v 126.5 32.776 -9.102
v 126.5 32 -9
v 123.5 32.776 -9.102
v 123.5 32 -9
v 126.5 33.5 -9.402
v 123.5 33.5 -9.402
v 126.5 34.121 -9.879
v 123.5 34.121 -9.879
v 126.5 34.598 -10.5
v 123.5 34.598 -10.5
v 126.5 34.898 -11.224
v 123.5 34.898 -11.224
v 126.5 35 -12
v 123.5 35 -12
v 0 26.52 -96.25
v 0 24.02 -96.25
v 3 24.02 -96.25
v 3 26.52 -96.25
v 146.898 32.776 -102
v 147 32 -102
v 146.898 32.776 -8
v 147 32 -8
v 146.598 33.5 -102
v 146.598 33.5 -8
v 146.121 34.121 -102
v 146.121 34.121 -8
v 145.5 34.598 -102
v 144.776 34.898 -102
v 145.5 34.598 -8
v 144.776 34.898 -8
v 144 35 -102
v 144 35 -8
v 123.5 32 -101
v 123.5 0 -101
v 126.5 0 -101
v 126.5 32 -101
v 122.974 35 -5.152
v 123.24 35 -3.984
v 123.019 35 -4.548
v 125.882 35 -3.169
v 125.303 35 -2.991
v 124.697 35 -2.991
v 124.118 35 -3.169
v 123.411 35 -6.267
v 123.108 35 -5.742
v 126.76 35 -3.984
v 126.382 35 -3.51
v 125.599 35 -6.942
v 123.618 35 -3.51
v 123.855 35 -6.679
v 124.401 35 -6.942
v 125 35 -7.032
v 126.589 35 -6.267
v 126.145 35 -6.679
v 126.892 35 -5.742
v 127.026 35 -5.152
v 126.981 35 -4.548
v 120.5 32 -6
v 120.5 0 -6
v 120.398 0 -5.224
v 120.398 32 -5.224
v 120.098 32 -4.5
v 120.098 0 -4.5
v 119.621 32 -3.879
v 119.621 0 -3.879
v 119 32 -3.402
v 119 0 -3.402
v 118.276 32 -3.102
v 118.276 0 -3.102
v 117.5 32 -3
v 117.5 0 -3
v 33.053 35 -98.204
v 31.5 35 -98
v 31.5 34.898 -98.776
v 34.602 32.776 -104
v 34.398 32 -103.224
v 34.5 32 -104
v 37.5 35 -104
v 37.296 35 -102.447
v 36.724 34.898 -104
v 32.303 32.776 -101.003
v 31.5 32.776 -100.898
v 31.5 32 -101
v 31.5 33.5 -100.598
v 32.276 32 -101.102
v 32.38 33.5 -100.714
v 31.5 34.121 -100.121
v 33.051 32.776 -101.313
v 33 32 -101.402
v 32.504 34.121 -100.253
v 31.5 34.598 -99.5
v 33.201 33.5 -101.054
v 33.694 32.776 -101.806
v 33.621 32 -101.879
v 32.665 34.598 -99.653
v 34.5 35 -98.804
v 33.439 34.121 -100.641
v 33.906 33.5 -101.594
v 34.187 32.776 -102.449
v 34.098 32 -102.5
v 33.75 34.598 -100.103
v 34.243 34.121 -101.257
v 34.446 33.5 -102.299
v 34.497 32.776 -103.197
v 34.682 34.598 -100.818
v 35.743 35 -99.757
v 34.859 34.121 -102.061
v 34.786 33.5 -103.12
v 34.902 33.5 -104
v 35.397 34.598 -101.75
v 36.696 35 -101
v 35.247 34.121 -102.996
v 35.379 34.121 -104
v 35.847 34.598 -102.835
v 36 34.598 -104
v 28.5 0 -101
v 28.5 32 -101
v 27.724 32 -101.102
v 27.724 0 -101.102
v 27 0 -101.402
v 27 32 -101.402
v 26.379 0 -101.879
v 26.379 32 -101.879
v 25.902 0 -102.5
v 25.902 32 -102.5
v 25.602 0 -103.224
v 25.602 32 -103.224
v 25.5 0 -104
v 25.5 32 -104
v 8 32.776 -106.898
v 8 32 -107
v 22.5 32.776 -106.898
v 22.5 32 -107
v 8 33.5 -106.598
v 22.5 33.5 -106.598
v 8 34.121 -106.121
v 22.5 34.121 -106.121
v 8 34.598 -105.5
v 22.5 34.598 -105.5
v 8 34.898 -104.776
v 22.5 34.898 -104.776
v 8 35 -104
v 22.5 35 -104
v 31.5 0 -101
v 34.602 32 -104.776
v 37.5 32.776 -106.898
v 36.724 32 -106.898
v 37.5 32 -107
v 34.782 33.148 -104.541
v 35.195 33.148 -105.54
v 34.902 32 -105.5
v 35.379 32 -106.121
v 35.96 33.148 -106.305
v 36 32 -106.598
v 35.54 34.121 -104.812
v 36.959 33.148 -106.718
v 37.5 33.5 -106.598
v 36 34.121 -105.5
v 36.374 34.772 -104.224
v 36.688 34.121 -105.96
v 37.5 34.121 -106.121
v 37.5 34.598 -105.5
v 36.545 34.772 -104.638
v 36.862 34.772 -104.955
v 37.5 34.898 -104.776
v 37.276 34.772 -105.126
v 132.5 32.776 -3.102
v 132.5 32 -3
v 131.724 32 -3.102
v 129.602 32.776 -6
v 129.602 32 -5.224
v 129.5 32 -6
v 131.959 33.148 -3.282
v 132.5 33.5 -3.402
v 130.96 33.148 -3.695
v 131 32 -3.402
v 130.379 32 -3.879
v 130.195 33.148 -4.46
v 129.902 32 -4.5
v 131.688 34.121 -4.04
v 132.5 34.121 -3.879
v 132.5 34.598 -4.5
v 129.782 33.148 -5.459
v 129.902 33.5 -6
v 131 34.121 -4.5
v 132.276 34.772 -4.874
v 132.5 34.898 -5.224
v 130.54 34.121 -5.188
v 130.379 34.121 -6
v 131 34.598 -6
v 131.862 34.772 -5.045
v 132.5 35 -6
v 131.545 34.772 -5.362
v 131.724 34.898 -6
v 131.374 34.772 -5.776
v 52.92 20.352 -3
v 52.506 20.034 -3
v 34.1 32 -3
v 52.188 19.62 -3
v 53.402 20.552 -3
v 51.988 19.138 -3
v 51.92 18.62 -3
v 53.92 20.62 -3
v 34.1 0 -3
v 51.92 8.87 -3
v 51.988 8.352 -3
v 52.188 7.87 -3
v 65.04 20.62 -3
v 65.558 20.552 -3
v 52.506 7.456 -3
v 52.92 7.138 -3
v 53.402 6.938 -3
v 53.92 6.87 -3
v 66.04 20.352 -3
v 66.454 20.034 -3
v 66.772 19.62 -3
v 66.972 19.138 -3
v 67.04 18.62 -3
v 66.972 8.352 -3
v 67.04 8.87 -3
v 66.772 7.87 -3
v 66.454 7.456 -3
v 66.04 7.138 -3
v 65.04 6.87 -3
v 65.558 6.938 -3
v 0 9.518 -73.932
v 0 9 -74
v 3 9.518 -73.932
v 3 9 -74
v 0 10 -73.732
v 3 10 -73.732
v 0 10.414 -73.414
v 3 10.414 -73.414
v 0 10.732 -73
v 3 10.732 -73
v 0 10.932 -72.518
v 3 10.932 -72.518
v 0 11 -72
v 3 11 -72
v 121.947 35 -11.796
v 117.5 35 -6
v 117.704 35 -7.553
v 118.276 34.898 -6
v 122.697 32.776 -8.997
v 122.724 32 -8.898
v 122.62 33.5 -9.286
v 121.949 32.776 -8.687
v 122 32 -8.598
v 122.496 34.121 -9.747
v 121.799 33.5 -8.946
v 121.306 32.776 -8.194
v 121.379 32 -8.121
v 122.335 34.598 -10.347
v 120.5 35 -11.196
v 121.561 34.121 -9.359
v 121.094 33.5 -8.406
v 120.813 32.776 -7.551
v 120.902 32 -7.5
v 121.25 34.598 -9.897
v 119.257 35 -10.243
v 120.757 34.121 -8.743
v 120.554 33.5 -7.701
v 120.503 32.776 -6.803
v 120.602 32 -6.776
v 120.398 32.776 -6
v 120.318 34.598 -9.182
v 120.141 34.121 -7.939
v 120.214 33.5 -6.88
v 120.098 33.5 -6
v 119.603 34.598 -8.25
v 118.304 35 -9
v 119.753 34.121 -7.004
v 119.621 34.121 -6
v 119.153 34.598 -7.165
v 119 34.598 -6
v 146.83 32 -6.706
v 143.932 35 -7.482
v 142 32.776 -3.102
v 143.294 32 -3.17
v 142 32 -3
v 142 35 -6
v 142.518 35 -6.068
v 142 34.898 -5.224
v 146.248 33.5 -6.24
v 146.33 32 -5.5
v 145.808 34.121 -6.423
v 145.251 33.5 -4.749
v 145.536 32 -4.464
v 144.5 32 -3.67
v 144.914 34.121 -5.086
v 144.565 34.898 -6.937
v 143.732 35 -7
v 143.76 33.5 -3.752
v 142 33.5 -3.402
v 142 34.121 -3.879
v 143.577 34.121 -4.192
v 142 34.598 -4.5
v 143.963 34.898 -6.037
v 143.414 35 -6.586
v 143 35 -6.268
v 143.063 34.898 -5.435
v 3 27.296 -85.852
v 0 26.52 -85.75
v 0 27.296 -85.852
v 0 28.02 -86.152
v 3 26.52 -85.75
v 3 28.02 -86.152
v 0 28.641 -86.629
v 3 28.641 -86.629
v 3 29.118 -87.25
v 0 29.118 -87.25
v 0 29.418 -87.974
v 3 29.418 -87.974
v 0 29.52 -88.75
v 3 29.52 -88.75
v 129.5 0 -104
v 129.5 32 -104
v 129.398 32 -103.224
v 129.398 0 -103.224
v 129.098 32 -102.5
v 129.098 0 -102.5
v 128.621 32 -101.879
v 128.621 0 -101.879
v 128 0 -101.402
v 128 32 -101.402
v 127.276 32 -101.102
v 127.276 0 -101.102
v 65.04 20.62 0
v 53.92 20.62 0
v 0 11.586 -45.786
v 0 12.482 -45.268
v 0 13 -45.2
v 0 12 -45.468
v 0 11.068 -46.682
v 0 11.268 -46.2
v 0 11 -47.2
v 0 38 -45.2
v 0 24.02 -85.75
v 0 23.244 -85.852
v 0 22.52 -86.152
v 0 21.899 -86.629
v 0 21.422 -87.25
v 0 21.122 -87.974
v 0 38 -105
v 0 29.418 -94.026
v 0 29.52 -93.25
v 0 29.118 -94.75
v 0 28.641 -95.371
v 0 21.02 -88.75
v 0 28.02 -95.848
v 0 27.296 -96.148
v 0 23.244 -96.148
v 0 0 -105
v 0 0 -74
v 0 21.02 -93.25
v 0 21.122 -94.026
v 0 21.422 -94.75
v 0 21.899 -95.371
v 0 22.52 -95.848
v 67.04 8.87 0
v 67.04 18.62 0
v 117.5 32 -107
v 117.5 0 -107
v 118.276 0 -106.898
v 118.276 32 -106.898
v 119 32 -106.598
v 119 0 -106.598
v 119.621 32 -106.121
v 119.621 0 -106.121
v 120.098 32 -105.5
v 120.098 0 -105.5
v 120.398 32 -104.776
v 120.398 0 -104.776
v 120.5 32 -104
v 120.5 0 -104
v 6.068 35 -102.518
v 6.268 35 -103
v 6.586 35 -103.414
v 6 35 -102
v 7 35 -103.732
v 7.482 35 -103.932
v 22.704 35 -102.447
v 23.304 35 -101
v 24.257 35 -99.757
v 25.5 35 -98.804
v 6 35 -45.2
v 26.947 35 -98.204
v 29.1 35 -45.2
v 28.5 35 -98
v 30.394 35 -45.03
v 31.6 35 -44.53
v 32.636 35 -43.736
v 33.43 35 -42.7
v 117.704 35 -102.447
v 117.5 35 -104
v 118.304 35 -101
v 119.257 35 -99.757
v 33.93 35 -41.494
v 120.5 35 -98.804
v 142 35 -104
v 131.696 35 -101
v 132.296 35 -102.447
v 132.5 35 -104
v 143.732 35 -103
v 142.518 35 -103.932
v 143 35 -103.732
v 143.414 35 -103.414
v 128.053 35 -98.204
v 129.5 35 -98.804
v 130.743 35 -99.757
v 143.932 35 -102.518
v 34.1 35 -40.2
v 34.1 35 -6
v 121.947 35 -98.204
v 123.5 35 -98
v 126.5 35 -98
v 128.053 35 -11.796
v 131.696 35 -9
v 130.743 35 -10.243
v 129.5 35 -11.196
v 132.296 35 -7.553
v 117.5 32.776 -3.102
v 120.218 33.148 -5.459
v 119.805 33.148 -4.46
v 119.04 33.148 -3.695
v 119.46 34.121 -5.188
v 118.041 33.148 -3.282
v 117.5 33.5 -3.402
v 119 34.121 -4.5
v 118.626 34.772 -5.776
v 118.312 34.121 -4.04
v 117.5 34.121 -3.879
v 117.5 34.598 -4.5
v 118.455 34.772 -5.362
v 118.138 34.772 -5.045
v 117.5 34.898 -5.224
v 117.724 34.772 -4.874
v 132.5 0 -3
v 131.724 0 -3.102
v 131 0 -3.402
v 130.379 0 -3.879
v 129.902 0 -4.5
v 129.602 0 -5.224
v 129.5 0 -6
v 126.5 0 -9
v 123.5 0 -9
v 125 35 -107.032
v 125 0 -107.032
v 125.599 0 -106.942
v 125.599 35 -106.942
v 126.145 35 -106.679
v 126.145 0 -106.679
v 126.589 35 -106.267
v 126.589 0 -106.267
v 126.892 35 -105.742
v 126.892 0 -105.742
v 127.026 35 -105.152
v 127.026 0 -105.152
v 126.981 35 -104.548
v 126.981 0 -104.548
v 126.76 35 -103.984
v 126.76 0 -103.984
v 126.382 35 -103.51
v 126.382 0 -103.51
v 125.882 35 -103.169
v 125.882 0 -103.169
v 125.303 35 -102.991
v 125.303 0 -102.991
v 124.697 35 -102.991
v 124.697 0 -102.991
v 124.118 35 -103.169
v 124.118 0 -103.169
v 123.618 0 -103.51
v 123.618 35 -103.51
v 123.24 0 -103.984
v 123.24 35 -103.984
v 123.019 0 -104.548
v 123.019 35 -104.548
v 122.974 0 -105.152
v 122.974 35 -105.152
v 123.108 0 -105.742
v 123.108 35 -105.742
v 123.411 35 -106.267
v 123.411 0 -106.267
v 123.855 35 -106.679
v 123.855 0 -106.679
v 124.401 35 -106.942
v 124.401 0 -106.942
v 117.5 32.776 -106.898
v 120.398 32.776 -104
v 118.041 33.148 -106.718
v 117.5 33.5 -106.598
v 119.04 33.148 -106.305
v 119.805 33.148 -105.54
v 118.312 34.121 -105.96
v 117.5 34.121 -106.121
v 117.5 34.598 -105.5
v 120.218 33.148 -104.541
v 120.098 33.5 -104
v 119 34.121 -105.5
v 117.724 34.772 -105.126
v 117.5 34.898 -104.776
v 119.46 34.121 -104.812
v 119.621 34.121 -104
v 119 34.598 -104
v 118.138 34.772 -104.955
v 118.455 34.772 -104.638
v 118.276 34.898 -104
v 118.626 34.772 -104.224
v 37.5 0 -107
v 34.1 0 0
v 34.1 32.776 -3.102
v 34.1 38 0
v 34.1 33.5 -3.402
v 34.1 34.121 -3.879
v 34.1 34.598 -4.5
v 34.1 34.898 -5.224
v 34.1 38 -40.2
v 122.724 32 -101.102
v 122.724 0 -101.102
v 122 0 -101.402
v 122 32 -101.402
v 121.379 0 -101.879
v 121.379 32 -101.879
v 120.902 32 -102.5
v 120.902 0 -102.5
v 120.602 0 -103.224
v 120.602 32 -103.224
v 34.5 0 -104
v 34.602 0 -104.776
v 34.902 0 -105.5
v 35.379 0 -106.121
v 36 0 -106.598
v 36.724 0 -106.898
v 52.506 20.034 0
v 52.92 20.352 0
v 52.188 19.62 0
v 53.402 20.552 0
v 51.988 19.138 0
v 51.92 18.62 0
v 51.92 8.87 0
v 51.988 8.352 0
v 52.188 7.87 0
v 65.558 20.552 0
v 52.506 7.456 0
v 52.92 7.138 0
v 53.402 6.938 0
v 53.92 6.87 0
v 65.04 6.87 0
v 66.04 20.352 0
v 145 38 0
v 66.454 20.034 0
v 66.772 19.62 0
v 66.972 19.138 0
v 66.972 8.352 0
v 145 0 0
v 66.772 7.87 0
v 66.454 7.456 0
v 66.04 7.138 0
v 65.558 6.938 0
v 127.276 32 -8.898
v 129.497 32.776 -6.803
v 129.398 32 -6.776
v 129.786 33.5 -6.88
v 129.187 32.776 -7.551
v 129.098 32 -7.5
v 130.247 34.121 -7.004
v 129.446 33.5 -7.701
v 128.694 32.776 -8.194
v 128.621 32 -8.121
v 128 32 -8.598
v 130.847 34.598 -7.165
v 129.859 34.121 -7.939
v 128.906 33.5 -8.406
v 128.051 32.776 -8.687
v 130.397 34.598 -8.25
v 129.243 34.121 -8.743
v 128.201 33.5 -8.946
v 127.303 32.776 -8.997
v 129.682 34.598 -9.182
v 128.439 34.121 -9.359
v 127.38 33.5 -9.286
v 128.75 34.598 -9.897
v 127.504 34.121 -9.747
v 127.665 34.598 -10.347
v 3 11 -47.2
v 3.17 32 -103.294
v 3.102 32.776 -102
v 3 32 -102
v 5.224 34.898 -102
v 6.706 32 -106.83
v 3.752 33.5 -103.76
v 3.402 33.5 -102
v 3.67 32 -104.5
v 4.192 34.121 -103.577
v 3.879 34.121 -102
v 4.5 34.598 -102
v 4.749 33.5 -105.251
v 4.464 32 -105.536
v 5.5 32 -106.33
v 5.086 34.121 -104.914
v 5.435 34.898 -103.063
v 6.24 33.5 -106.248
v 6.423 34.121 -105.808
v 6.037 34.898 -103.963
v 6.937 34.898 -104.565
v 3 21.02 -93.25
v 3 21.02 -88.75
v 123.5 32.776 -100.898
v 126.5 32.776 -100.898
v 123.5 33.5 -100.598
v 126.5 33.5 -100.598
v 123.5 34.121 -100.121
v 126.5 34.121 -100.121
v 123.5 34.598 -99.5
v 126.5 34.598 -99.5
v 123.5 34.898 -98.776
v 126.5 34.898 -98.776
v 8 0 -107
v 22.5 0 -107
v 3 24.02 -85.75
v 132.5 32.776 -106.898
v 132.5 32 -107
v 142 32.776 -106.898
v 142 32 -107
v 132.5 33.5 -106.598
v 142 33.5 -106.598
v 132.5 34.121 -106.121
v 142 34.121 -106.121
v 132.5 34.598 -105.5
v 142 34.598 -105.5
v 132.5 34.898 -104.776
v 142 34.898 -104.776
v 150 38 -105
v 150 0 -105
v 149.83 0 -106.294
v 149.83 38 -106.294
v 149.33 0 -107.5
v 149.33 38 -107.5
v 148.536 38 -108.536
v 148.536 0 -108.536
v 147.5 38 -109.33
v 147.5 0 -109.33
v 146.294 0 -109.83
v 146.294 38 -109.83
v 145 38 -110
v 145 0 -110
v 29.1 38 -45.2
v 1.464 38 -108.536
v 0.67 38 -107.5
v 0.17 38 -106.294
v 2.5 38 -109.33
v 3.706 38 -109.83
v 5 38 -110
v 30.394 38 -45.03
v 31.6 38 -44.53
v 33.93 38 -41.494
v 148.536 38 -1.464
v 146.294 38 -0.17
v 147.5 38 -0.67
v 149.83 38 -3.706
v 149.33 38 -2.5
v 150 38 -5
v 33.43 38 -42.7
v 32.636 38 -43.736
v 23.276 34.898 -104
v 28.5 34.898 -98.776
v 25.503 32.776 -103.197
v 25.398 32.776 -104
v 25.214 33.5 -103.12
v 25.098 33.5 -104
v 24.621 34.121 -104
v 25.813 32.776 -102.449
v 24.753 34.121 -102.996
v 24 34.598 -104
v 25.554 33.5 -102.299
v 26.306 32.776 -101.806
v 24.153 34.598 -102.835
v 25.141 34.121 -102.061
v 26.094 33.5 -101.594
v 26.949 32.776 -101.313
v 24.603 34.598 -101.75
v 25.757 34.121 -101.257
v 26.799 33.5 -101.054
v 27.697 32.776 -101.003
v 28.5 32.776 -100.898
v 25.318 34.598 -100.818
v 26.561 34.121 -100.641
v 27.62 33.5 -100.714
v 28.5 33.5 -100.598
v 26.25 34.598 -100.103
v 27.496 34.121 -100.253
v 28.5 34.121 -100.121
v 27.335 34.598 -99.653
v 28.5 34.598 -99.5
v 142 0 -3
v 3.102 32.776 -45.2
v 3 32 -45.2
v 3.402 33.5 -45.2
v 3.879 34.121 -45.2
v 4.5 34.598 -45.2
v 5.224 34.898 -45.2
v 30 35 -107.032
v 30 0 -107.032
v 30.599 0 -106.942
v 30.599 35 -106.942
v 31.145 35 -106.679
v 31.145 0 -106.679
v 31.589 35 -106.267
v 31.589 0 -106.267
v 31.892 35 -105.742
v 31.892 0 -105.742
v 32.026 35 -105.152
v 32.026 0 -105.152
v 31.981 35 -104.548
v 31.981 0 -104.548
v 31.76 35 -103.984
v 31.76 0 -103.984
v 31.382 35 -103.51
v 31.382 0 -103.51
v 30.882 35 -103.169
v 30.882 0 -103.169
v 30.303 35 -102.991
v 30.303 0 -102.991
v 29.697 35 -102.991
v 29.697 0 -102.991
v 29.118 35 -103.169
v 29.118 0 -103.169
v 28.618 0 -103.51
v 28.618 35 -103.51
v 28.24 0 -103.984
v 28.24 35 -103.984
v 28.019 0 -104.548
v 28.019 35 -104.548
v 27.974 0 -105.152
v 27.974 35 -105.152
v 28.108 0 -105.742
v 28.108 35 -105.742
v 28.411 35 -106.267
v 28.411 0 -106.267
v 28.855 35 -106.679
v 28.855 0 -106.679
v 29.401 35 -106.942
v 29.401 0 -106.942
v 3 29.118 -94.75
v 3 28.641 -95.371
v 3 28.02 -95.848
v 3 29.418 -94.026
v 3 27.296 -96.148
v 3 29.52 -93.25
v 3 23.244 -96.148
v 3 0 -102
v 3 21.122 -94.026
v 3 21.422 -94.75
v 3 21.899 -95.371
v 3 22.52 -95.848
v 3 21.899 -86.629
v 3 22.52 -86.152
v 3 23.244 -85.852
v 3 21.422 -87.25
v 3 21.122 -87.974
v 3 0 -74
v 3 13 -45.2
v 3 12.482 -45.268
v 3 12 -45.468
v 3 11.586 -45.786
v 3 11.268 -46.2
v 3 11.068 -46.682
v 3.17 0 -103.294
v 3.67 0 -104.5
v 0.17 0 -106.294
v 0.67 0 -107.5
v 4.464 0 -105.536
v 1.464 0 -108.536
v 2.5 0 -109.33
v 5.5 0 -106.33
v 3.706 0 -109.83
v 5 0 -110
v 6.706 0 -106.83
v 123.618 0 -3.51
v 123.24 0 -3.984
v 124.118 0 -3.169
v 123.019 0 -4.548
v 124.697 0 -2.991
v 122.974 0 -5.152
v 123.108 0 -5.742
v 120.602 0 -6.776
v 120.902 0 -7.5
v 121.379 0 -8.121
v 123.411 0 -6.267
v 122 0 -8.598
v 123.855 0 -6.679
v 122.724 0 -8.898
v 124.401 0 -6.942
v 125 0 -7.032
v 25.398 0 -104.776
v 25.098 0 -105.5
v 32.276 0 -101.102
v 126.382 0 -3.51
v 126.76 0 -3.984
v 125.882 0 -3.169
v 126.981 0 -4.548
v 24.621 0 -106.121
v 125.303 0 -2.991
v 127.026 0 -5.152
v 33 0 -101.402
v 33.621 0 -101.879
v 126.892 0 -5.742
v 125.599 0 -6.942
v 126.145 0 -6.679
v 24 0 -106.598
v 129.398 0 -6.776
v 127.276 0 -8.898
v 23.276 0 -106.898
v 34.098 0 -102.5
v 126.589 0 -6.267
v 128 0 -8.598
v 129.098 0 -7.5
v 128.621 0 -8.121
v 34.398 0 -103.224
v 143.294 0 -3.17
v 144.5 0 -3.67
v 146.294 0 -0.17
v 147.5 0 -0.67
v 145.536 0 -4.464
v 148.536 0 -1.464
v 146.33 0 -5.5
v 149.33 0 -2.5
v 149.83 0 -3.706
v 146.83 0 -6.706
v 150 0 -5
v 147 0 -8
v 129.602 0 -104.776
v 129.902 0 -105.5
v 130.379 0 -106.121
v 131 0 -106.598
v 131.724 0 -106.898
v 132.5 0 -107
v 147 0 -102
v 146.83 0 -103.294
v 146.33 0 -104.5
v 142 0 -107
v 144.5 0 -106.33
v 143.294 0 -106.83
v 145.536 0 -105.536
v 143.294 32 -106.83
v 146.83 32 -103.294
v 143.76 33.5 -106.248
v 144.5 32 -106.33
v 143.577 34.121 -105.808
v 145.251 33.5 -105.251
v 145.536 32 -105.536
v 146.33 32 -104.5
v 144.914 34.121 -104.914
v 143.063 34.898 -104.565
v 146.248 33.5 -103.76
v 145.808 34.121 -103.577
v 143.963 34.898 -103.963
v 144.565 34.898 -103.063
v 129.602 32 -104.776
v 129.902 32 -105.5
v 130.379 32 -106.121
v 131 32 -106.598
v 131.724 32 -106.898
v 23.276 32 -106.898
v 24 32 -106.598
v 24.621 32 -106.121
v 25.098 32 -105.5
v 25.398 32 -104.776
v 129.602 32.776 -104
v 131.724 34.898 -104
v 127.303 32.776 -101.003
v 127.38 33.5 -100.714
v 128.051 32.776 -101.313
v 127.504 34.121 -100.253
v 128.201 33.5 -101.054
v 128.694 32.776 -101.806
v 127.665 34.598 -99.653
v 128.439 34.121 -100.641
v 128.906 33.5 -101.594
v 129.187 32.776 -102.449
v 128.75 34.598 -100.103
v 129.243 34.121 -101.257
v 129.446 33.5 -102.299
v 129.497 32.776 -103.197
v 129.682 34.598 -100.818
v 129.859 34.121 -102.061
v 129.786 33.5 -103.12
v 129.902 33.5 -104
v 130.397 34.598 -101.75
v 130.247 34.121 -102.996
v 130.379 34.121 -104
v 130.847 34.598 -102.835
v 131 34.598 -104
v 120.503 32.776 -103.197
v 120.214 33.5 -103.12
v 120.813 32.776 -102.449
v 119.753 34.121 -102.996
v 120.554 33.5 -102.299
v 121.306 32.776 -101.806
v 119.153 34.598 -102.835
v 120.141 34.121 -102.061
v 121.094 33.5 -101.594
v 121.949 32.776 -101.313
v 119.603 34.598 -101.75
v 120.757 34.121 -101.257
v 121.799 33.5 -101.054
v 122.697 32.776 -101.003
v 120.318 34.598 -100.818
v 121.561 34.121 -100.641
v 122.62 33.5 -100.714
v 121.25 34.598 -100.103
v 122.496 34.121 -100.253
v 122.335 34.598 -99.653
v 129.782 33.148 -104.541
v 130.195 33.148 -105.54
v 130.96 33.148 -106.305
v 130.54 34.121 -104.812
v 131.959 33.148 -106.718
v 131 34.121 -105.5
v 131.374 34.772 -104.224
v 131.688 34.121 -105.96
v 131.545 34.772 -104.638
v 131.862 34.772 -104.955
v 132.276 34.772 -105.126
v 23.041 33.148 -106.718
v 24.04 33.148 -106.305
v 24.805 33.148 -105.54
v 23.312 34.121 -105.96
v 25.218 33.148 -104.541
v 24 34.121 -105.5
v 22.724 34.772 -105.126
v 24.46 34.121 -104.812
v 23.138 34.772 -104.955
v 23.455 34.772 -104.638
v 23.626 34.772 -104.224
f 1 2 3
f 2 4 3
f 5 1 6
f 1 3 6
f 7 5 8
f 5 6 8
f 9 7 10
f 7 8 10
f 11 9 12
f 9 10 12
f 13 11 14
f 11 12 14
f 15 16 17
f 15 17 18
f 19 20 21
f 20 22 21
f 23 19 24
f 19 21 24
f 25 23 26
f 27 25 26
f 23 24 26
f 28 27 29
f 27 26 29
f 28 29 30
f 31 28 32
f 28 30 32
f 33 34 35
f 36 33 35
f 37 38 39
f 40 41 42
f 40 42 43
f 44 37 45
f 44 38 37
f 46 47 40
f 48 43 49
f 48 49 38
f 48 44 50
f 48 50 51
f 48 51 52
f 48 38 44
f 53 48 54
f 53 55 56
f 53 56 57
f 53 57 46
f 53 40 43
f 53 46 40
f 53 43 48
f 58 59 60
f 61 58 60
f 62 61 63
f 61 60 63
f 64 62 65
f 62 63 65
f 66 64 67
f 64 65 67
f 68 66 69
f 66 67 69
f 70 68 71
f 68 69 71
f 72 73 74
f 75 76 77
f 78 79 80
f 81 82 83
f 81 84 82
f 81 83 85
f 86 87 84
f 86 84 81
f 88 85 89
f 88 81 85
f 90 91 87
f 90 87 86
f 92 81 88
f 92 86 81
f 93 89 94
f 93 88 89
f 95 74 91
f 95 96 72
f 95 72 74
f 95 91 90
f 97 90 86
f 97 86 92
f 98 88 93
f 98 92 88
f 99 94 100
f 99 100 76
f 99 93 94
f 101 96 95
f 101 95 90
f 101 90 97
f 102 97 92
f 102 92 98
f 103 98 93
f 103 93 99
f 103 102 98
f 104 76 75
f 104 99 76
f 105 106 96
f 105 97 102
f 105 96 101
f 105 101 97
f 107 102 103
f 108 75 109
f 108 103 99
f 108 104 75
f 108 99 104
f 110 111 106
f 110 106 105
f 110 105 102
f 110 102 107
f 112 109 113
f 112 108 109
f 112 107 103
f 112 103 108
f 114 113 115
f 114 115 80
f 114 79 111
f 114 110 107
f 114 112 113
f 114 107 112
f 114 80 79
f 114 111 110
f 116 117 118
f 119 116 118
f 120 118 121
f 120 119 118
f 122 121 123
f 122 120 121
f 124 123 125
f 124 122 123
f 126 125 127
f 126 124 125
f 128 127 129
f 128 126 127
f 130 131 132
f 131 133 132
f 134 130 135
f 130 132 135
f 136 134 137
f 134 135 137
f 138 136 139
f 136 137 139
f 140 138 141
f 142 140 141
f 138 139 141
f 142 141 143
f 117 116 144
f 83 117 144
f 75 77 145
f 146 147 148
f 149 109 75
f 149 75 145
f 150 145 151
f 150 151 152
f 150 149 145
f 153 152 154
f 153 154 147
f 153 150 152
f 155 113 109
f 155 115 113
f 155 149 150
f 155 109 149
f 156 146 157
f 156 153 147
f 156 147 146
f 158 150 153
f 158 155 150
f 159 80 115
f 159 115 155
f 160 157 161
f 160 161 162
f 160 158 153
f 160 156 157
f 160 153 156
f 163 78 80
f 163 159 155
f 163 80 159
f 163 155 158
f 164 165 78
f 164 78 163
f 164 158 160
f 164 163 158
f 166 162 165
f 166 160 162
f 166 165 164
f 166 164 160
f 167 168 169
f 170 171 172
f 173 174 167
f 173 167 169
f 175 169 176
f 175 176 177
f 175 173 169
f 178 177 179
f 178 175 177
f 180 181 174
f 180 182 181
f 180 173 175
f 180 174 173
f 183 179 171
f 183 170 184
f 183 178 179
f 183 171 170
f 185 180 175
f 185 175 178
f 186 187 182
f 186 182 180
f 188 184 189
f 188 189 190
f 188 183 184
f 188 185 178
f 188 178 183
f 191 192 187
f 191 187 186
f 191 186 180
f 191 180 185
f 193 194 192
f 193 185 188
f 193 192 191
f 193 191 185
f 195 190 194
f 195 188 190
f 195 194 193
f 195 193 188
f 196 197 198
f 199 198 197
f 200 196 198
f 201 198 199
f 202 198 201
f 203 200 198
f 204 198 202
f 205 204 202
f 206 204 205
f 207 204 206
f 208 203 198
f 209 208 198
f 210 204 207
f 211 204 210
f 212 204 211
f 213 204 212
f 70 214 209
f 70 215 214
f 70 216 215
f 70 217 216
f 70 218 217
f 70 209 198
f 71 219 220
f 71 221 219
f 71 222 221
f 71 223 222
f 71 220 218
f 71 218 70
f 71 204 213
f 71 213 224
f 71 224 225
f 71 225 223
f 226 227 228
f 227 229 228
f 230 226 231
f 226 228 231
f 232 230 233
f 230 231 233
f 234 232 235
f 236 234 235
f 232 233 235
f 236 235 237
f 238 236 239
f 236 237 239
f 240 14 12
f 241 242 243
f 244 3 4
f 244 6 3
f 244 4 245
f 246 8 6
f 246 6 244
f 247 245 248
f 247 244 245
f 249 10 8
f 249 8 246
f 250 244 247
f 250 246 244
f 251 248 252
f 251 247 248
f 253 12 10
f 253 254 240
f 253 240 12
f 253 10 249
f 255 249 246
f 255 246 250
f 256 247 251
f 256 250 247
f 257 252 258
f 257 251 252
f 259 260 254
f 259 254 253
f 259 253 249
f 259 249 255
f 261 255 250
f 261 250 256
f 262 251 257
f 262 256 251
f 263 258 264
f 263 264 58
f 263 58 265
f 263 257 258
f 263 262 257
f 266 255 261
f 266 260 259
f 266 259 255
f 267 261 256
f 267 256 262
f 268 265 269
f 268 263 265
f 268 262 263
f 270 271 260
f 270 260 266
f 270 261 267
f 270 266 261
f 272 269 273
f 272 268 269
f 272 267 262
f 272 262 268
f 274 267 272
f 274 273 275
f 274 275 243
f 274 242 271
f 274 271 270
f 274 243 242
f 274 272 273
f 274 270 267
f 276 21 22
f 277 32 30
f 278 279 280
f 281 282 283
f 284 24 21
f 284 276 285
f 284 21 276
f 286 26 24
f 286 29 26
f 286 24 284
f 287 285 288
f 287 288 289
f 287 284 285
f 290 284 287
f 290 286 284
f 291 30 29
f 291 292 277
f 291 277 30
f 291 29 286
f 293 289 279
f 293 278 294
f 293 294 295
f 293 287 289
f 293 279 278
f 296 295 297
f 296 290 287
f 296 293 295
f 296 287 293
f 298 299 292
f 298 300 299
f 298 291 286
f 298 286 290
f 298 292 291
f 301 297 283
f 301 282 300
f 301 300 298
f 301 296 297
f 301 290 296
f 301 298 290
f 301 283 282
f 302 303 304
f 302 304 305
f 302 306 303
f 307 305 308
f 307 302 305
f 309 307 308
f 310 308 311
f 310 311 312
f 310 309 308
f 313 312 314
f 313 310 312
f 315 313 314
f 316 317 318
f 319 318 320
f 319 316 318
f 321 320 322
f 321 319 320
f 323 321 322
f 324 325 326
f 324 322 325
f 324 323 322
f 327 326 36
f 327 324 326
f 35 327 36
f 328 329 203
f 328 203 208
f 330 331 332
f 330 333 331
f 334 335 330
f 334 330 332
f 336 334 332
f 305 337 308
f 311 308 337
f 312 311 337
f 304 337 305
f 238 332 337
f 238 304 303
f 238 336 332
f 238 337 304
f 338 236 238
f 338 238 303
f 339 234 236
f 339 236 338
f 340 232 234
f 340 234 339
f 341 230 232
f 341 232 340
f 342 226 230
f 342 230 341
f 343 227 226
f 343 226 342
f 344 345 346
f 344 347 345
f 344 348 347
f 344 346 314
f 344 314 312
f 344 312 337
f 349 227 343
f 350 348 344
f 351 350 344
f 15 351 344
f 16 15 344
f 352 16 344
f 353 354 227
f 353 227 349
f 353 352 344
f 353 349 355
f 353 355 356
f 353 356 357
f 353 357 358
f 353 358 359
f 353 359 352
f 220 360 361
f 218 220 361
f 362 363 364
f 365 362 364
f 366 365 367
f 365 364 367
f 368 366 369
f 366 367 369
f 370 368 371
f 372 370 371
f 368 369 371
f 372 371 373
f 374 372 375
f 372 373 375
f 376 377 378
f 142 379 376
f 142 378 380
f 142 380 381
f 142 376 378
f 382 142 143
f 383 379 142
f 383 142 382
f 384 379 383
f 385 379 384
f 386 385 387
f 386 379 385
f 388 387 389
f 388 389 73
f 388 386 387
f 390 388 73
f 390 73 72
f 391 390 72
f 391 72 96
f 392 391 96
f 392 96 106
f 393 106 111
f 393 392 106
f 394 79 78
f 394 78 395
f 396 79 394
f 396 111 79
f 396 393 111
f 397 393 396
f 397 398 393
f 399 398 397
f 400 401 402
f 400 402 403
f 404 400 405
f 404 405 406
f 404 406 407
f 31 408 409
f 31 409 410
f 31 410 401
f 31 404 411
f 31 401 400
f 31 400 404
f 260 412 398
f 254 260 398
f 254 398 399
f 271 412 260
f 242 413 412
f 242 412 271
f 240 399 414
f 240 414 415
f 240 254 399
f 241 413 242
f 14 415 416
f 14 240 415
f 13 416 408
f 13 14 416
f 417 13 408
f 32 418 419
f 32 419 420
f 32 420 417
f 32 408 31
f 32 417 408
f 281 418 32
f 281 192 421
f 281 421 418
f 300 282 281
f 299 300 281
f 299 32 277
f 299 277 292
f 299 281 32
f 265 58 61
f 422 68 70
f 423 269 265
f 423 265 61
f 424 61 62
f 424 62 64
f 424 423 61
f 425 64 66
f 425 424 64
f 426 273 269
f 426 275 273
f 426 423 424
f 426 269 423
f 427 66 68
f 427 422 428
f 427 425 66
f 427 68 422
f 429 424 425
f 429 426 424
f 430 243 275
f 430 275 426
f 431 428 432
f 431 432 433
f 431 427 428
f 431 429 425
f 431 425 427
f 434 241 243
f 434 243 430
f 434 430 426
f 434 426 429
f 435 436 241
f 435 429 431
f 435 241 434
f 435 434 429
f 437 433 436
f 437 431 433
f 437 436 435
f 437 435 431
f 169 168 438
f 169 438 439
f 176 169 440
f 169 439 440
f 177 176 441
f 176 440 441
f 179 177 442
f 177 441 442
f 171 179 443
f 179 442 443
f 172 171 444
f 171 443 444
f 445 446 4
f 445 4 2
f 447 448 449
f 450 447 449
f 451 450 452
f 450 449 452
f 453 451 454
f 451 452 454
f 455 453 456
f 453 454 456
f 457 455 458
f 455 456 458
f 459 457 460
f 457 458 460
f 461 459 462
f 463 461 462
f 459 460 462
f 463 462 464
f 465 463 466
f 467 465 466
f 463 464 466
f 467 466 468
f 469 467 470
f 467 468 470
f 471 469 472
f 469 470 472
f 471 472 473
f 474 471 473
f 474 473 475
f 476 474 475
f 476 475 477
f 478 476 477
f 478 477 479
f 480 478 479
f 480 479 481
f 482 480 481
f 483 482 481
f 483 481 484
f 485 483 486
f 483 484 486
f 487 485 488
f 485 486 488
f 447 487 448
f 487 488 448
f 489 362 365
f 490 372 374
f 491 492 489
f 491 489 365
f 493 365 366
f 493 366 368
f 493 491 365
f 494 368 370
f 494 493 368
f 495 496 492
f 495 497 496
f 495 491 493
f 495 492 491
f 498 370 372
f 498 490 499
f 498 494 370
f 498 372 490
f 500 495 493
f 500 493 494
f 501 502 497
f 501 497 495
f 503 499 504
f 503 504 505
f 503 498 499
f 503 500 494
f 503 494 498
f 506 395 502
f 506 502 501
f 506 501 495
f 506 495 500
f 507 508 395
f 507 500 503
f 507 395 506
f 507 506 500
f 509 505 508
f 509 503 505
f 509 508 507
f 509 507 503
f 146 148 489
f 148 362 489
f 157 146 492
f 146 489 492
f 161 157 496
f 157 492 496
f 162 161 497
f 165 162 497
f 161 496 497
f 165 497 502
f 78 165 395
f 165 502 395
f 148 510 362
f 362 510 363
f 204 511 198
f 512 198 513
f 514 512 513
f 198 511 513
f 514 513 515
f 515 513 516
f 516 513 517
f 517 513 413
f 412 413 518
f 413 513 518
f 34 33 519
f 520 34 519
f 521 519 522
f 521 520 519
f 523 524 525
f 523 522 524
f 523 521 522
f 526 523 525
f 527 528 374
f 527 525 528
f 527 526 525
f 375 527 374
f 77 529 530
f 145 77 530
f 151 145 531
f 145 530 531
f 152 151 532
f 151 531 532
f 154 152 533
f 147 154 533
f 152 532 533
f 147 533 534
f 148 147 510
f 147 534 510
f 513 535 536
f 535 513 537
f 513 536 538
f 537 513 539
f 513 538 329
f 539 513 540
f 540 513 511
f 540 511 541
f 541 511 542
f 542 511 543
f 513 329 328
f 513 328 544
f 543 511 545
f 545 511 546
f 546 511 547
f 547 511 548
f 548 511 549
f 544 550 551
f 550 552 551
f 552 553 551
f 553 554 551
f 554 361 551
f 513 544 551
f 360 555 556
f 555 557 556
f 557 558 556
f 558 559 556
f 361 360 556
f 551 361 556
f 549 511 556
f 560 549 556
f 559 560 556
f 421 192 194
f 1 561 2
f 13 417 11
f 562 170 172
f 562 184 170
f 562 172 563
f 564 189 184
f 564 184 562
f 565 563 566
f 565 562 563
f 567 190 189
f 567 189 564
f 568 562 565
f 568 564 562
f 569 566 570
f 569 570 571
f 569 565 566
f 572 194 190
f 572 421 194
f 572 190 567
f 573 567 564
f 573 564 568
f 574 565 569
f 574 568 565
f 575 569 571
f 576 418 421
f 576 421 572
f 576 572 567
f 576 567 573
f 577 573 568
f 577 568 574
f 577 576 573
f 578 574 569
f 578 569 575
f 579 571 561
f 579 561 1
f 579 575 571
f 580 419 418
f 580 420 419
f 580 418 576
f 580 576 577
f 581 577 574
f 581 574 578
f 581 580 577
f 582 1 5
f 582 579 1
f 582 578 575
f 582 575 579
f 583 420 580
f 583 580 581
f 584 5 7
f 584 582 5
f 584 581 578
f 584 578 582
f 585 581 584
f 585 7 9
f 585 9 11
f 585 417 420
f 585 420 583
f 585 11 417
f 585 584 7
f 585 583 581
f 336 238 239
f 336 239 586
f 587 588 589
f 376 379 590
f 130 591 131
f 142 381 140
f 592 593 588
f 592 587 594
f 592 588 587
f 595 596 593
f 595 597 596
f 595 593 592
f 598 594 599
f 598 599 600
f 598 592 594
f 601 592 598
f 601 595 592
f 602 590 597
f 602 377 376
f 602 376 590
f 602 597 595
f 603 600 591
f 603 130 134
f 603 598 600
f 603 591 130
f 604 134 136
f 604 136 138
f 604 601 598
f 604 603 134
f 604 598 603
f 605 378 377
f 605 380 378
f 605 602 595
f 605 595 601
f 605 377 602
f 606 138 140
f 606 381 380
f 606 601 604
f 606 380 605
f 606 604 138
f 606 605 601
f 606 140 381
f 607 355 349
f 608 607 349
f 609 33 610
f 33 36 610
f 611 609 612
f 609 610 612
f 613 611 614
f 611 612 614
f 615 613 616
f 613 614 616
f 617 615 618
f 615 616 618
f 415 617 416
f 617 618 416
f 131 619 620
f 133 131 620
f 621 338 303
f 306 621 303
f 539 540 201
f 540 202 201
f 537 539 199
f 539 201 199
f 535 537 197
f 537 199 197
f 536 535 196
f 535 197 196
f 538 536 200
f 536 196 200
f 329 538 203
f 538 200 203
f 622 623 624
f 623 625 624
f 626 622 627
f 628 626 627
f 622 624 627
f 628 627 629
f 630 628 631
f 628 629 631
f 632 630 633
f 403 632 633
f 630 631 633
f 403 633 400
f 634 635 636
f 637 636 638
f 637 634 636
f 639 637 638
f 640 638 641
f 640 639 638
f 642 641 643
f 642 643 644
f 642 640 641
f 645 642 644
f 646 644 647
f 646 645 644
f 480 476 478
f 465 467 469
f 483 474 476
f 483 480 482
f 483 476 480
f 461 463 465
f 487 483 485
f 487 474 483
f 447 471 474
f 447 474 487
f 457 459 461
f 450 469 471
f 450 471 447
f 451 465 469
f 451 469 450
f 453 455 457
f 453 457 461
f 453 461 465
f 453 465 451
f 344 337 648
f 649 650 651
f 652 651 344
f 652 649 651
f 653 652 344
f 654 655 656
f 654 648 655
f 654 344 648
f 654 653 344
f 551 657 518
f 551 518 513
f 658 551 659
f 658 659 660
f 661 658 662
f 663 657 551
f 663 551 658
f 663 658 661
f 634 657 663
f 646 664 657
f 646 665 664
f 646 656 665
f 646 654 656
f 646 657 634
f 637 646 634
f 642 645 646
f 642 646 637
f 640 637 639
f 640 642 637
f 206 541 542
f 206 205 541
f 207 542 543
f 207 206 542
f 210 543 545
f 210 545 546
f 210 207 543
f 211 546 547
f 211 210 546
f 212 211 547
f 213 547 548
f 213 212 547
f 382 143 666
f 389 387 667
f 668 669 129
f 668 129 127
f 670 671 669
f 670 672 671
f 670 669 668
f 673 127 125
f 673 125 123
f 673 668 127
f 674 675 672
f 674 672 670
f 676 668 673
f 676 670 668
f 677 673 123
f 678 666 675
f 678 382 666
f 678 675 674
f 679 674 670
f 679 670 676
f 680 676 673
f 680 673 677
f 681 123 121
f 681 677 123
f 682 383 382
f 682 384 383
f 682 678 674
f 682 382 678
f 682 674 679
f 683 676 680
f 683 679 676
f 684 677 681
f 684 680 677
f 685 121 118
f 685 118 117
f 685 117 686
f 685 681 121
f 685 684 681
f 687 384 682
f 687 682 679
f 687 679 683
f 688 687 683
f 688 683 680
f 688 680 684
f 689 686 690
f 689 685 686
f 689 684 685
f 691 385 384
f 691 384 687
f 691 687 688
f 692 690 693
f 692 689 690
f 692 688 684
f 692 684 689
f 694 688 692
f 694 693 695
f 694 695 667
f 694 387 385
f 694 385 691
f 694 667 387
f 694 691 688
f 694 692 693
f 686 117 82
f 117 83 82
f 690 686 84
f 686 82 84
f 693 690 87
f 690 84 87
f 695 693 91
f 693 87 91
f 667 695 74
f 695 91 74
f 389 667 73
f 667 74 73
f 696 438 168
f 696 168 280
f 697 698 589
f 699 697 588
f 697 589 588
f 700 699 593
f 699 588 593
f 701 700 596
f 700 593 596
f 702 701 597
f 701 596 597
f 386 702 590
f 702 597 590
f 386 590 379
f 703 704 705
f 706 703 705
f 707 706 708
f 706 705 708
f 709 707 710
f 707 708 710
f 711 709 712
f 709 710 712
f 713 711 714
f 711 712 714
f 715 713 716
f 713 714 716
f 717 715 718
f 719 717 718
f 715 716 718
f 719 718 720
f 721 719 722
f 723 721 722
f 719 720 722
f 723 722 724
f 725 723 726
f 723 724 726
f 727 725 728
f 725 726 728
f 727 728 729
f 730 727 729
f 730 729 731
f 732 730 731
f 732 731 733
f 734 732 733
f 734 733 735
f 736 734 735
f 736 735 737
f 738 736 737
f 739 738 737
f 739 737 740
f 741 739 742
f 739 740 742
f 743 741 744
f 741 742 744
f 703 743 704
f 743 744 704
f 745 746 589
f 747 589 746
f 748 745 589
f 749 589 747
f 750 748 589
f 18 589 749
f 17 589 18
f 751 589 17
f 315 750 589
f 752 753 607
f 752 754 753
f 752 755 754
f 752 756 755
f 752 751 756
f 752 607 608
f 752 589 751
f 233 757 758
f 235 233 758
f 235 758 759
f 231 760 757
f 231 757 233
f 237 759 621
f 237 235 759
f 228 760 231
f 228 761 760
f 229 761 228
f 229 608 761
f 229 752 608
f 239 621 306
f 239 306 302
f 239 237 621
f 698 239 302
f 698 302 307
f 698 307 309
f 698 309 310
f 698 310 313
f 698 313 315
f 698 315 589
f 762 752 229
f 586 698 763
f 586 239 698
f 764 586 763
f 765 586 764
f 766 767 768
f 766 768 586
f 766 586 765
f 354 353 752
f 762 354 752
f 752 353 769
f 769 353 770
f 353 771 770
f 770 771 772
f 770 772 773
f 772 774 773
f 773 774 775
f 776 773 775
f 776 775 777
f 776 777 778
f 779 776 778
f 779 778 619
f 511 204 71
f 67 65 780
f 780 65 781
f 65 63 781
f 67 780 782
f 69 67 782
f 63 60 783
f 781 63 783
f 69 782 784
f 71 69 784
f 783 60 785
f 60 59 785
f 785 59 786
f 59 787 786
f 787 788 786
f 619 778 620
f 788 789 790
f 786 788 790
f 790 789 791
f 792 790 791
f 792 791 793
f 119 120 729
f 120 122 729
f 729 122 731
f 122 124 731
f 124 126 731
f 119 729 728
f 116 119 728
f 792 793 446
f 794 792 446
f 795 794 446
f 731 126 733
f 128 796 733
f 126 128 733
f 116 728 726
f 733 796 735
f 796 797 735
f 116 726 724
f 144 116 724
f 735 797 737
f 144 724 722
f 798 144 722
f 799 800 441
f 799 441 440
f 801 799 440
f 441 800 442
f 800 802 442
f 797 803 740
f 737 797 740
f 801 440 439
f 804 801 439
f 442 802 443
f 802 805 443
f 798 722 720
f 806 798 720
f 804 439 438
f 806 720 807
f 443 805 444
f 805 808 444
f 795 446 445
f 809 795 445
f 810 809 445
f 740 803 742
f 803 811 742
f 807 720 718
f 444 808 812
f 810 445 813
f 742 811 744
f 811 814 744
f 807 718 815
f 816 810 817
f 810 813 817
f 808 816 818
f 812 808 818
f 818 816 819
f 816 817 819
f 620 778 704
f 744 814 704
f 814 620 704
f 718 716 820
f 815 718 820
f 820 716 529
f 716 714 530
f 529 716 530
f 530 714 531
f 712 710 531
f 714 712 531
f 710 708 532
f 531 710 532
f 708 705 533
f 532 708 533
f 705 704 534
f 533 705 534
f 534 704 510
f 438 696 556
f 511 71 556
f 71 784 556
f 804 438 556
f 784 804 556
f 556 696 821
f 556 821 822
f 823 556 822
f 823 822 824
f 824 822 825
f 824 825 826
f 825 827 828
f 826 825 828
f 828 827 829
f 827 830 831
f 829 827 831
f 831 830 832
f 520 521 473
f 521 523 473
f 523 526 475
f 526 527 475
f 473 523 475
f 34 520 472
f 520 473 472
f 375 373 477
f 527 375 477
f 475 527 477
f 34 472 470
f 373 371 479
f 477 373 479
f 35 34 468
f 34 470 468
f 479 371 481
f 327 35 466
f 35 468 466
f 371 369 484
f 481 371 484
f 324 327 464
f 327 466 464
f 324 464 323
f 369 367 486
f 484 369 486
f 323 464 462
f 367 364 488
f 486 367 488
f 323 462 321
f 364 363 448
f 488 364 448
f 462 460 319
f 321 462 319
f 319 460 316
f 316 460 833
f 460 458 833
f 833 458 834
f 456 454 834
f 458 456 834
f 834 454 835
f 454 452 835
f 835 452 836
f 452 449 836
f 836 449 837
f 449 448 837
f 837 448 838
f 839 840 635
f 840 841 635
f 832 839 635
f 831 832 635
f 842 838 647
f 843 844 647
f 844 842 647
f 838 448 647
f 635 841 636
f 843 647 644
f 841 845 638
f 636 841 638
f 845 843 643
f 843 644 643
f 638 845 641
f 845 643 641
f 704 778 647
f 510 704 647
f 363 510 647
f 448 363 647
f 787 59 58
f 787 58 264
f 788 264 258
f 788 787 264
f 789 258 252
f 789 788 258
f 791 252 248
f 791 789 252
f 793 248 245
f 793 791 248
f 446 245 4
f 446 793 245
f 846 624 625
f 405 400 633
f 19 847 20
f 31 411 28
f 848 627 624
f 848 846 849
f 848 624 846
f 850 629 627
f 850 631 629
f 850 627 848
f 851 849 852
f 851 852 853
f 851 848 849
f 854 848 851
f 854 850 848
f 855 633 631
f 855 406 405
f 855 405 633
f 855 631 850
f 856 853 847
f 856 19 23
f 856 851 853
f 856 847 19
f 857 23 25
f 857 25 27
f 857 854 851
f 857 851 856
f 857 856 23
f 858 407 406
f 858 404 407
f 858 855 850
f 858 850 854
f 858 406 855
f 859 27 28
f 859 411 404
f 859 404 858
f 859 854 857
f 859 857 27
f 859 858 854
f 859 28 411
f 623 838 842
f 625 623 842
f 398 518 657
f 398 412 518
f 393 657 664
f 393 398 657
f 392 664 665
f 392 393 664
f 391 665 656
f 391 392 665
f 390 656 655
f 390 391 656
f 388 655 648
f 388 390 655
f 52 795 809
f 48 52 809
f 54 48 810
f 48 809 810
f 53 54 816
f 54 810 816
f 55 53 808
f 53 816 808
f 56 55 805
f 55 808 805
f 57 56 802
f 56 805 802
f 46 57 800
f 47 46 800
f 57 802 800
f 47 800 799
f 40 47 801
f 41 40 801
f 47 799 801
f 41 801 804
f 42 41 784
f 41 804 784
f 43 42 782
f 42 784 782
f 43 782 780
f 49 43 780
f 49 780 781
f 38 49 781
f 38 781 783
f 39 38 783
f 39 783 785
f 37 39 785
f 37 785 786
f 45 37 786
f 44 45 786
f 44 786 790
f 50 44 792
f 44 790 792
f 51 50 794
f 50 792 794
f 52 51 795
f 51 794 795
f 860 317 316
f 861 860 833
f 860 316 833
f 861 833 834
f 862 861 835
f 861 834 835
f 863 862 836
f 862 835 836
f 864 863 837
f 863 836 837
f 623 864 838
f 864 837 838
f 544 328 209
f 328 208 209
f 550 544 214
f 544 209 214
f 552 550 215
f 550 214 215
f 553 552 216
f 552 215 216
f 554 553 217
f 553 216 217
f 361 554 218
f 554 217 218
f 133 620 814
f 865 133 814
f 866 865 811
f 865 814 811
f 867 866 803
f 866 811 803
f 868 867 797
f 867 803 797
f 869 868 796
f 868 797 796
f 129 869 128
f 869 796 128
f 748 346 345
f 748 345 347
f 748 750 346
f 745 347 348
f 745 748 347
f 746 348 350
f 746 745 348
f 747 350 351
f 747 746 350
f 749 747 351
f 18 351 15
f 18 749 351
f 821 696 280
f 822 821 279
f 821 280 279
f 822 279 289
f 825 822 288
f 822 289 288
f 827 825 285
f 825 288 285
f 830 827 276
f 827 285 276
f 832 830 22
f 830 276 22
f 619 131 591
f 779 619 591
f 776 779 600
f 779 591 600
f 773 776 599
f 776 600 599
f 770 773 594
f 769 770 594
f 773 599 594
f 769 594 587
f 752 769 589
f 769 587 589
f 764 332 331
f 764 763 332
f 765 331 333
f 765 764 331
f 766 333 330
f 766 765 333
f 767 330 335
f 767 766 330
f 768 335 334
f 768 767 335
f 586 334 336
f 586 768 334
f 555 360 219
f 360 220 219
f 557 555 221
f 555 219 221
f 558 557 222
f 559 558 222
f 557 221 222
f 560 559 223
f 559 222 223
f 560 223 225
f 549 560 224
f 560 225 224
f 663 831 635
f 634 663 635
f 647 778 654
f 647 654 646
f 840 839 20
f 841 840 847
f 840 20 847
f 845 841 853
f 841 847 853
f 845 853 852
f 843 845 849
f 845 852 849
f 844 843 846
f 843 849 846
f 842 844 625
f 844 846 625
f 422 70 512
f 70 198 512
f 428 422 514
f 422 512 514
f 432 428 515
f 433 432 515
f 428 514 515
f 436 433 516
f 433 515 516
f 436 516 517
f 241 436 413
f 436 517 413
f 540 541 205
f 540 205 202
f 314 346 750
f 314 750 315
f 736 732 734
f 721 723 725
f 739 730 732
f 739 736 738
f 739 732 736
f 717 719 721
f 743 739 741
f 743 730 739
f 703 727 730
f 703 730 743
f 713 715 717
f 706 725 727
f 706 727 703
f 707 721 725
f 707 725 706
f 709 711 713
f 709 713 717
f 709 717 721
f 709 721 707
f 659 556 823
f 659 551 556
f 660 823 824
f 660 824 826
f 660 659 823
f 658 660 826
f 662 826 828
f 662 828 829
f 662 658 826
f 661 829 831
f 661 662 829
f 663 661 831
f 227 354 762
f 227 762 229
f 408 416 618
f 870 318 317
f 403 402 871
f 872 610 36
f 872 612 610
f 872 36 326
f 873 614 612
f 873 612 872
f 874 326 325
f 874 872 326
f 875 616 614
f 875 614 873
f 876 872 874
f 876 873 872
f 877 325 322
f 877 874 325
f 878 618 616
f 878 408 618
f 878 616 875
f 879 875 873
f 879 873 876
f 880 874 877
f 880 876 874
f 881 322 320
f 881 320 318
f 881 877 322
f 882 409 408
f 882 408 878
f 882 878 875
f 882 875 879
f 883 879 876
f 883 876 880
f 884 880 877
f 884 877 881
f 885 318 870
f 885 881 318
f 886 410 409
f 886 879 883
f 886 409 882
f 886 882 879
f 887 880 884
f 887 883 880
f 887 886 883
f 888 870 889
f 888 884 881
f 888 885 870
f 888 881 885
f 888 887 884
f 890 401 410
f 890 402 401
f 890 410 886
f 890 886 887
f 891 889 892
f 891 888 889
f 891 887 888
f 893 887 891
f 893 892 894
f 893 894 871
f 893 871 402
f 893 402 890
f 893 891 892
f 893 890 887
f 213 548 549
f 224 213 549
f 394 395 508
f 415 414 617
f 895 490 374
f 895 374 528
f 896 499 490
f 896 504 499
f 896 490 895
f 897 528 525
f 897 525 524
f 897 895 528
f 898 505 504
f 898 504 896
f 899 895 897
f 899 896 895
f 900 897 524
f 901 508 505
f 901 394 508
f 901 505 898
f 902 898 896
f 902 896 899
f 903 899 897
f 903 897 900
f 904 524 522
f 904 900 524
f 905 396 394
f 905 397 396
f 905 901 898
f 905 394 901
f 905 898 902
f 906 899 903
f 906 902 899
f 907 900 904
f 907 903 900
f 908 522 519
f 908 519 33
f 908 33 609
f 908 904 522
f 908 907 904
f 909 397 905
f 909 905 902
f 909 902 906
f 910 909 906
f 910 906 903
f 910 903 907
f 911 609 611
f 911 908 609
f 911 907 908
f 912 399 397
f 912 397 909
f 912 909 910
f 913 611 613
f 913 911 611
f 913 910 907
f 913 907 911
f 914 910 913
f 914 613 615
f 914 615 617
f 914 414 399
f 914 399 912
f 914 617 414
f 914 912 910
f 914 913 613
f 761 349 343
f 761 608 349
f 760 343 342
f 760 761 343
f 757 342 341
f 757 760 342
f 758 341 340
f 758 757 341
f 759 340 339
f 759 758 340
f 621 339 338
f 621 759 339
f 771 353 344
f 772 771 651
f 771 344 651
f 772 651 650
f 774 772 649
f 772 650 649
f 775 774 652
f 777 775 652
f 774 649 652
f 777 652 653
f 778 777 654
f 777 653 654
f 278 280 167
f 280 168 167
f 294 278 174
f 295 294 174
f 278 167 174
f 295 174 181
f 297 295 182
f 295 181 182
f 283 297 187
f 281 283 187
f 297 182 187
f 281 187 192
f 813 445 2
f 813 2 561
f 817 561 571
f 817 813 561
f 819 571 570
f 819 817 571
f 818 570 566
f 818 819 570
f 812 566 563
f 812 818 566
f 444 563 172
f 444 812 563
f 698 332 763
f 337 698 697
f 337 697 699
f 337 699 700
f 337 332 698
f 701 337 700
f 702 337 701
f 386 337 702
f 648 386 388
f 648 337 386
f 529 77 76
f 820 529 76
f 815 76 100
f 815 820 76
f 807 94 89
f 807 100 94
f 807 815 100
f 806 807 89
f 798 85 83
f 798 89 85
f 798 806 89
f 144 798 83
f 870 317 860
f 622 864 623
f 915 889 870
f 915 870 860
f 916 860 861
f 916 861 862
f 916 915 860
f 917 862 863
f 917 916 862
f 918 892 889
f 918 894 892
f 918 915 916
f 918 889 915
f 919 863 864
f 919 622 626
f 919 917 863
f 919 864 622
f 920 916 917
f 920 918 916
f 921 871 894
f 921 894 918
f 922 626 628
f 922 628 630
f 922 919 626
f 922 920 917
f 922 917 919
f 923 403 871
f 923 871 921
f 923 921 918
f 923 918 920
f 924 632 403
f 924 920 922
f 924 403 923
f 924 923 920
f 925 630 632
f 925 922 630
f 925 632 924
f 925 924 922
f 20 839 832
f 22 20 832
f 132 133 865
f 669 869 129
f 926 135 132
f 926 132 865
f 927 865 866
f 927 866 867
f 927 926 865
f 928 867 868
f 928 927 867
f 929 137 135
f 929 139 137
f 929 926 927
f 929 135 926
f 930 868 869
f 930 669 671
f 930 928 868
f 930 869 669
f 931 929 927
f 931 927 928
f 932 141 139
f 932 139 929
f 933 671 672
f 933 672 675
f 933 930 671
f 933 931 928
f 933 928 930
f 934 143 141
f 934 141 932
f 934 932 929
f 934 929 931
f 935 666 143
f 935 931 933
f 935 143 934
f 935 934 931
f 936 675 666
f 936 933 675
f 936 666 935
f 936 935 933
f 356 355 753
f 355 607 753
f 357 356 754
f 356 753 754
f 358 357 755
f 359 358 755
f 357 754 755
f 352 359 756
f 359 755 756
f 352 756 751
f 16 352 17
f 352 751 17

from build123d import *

# Parameters (mm, degrees)
SKETCH1_W           = 150
SKETCH1_H           = 110
BOSS_EXTRUDE1_DEPTH = 38
SKETCH3_W           = 144
SKETCH3_H           = 104
CUT_EXTRUDE1_DEPTH  = 35
CUT_EXTRUDE2_REACH  = 191.853
SKETCH5_W           = 10.5
SKETCH5_H           = 8.5
FILLET4_R           = 3
CUT_EXTRUDE3_REACH  = 191.853
SKETCH6_W           = 34.1
SKETCH6_H           = 45.2
CUT_EXTRUDE4_REACH  = 191.853
SKETCH10_W          = 15.12
SKETCH10_H          = 13.75
FILLET5_R           = 2
BOSS_EXTRUDE2_REACH = 191.853
SKETCH12_W          = 9
SKETCH12_H          = 6
SKETCH13_R          = 2.032
CUT_EXTRUDE5_DEPTH  = 35
CUT_EXTRUDE6_REACH  = 191.853
SKETCH14_W          = 28.8
SKETCH14_H          = 11
FILLET6_R           = 5
FILLET7_R           = 2
FILLET8_DEPTH       = 35
FILLET8_2_DEPTH     = 36
FILLET9_R           = 3


with BuildPart() as part:
    # Sketch1 → Boss-Extrude1 (new body)
    with BuildSketch(Plane(origin=(0, 0, 0), x_dir=(1, 0, 0), z_dir=(0, 1, 0))):
        with Locations((75, 55)):
            Rectangle(SKETCH1_W, SKETCH1_H)
    extrude(amount=BOSS_EXTRUDE1_DEPTH)

    # Sketch3 → Cut-Extrude1 (cut)
    with BuildSketch(Plane.XZ):
        with Locations((75, -55)):
            Rectangle(SKETCH3_W, SKETCH3_H)
    extrude(amount=-CUT_EXTRUDE1_DEPTH, mode=Mode.SUBTRACT)

    # Sketch5 → Cut-Extrude2 (cut, up to next)
    with BuildSketch(Plane.ZY, mode=Mode.PRIVATE) as cut_extrude2_sk1:
        with Locations((-91, 25.27)):
            Rectangle(SKETCH5_W, SKETCH5_H)
    cut_extrude2_tool1 = extrude(cut_extrude2_sk1.sketch, amount=-CUT_EXTRUDE2_REACH, mode=Mode.PRIVATE) & part.part
    add(cut_extrude2_tool1.solids().sort_by_distance((0, 25.27, -91))[0], mode=Mode.SUBTRACT)

    # Fillet4
    fillet4_edges = [part.edges().sort_by_distance(p)[0] for p in [
        (1.5, 21.02, -85.75),
        (1.5, 29.52, -85.75),
        (1.5, 29.52, -96.25),
        (1.5, 21.02, -96.25),
    ]]
    fillet(fillet4_edges, radius=FILLET4_R)

    # Sketch6 → Cut-Extrude3 (cut, up to next)
    with BuildSketch(Plane(origin=(0, 38, 0), x_dir=(1, 0, 0), z_dir=(0, 1, 0)), mode=Mode.PRIVATE) as cut_extrude3_sk1:
        with Locations((17.05, 22.6)):
            Rectangle(SKETCH6_W, SKETCH6_H)
    cut_extrude3_tool1 = extrude(cut_extrude3_sk1.sketch, amount=-CUT_EXTRUDE3_REACH, mode=Mode.PRIVATE) & part.part
    add(cut_extrude3_tool1.solids().sort_by_distance((17.05, 38, -22.6))[0], mode=Mode.SUBTRACT)

    # Sketch10 → Cut-Extrude4 (cut, up to next)
    with BuildSketch(Plane.XY, mode=Mode.PRIVATE) as cut_extrude4_sk1:
        with Locations((59.48, 13.745)):
            Rectangle(SKETCH10_W, SKETCH10_H)
    cut_extrude4_tool1 = extrude(cut_extrude4_sk1.sketch, amount=-CUT_EXTRUDE4_REACH, mode=Mode.PRIVATE) & part.part
    add(cut_extrude4_tool1.solids().sort_by_distance((59.48, 13.745, 0))[0], mode=Mode.SUBTRACT)

    # Fillet5
    fillet5_edges = [part.edges().sort_by_distance(p)[0] for p in [
        (51.92, 6.87, -1.5),
        (51.92, 20.62, -1.5),
        (67.04, 20.62, -1.5),
        (67.04, 6.87, -1.5),
    ]]
    fillet(fillet5_edges, radius=FILLET5_R)

    # Sketch12 → Boss-Extrude2 (add, up to next)
    with BuildSketch(Plane.XZ, mode=Mode.PRIVATE) as boss_extrude2_sk1:
        with Locations((125, -6)):
            Rectangle(SKETCH12_W, SKETCH12_H)
    boss_extrude2_tool1 = extrude(boss_extrude2_sk1.sketch, amount=-BOSS_EXTRUDE2_REACH, mode=Mode.PRIVATE) - part.part
    # Sketch12 → Boss-Extrude2 (add, up to next)
    with BuildSketch(Plane.XZ, mode=Mode.PRIVATE) as boss_extrude2_sk2:
        with Locations((30, -104)):
            Rectangle(SKETCH12_W, SKETCH12_H)
    boss_extrude2_tool2 = extrude(boss_extrude2_sk2.sketch, amount=-BOSS_EXTRUDE2_REACH, mode=Mode.PRIVATE) - part.part
    # Sketch12 → Boss-Extrude2 (add, up to next)
    with BuildSketch(Plane.XZ, mode=Mode.PRIVATE) as boss_extrude2_sk3:
        with Locations((125, -104)):
            Rectangle(SKETCH12_W, SKETCH12_H)
    boss_extrude2_tool3 = extrude(boss_extrude2_sk3.sketch, amount=-BOSS_EXTRUDE2_REACH, mode=Mode.PRIVATE) - part.part
    add(boss_extrude2_tool1.solids().sort_by_distance((125, 0, -6))[0])
    add(boss_extrude2_tool2.solids().sort_by_distance((30, 0, -104))[0])
    add(boss_extrude2_tool3.solids().sort_by_distance((125, 0, -104))[0])

    # Sketch13 → Cut-Extrude5 (cut)
    with BuildSketch(Plane.XZ):
        with Locations(Location((125, -5, 0), (0, 0, 270))):
            Circle(SKETCH13_R)
        with Locations(Location((125, -105, 0), (0, 0, 270))):
            Circle(SKETCH13_R)
        with Locations(Location((30, -105, 0), (0, 0, 270))):
            Circle(SKETCH13_R)
    extrude(amount=-CUT_EXTRUDE5_DEPTH, mode=Mode.SUBTRACT)

    # Sketch14 → Cut-Extrude6 (cut, up to next)
    with BuildSketch(Plane.ZY, mode=Mode.PRIVATE) as cut_extrude6_sk1:
        with Locations((-59.6, 5.5)):
            Rectangle(SKETCH14_W, SKETCH14_H)
    cut_extrude6_tool1 = extrude(cut_extrude6_sk1.sketch, amount=-CUT_EXTRUDE6_REACH, mode=Mode.PRIVATE) & part.part
    add(cut_extrude6_tool1.solids().sort_by_distance((0, 5.5, -59.6))[0], mode=Mode.SUBTRACT)

    # Fillet6
    fillet6_edges = [part.edges().sort_by_distance(p)[0] for p in [
        (147, 17.5, -3),
        (147, 17.5, -107),
        (3, 17.5, -107),
        (34.1, 36.5, -45.2),
        (0, 19, -110),
        (150, 19, -110),
        (150, 19, 0),
    ]]
    fillet(fillet6_edges, radius=FILLET6_R)

    # Fillet7
    fillet7_edges = [part.edges().sort_by_distance(p)[0] for p in [
        (1.5, 11, -74),
        (1.5, 11, -45.2),
    ]]
    fillet(fillet7_edges, radius=FILLET7_R)

    # Fillet8: read off the stored shape, not the designer's step
    # Fillet8 outline → Fillet8 (cut)
    with BuildSketch(Plane(origin=(0, 0, 0), x_dir=(1, 0, 0), z_dir=(0, 1, 0))):
        with BuildLine():
            Line((129.5, 101), (129.5, 104))
            ThreePointArc((129.5, 104), (128.621320344, 101.878679656), (126.5, 101))
            Line((126.5, 101), (129.5, 101))
        make_face()
        with BuildLine():
            Line((25.5, 101), (28.5, 101))
            ThreePointArc((28.5, 101), (26.378679656, 101.878679656), (25.5, 104))
            Line((25.5, 104), (25.5, 101))
        make_face()
        with BuildLine():
            Line((34.5, 101), (34.5, 104))
            ThreePointArc((34.5, 104), (33.621320344, 101.878679656), (31.5, 101))
            Line((31.5, 101), (34.5, 101))
        make_face()
        with BuildLine():
            Line((120.5, 101), (123.5, 101))
            ThreePointArc((123.5, 101), (121.378679656, 101.878679656), (120.5, 104))
            Line((120.5, 104), (120.5, 101))
        make_face()
        with BuildLine():
            Line((120.5, 9), (120.5, 6))
            ThreePointArc((120.5, 6), (121.378679656, 8.121320344), (123.5, 9))
            Line((123.5, 9), (120.5, 9))
        make_face()
        with BuildLine():
            Line((129.5, 9), (126.5, 9))
            ThreePointArc((126.5, 9), (128.621320344, 8.121320344), (129.5, 6))
            Line((129.5, 6), (129.5, 9))
        make_face()
    extrude(amount=FILLET8_DEPTH, mode=Mode.SUBTRACT)

    # Fillet8 2 outline → Fillet8 2 (add)
    with BuildSketch(Plane(origin=(0, 0, 0), x_dir=(1, 0, 0), z_dir=(0, 1, 0))):
        with BuildLine():
            Line((129.5, 107), (129.5, 104))
            ThreePointArc((129.5, 104), (130.378679656, 106.121320344), (132.5, 107))
            Line((132.5, 107), (129.5, 107))
        make_face()
        with BuildLine():
            ThreePointArc((22.5, 107), (24.621320344, 106.121320344), (25.5, 104))
            Line((25.5, 104), (25.5, 107))
            Line((25.5, 107), (22.5, 107))
        make_face()
        with BuildLine():
            ThreePointArc((34.5, 104), (35.378679656, 106.121320344), (37.5, 107))
            Line((37.5, 107), (34.5, 107))
            Line((34.5, 107), (34.5, 104))
        make_face()
        with BuildLine():
            ThreePointArc((117.5, 107), (119.621320344, 106.121320344), (120.5, 104))
            Line((120.5, 104), (120.5, 107))
            Line((120.5, 107), (117.5, 107))
        make_face()
        with BuildLine():
            Line((120.5, 3), (120.5, 6))
            ThreePointArc((120.5, 6), (119.621320344, 3.878679656), (117.5, 3))
            Line((117.5, 3), (120.5, 3))
        make_face()
        with BuildLine():
            ThreePointArc((132.5, 3), (130.378679656, 3.878679656), (129.5, 6))
            Line((129.5, 6), (129.5, 3))
            Line((129.5, 3), (132.5, 3))
        make_face()
    extrude(amount=FILLET8_2_DEPTH)

    # Fillet9
    fillet9_edges = [part.edges().sort_by_distance(p)[0] for p in [
        (147, 35, -55),
        (137.25, 35, -3),
        (15.25, 35, -107),
        (4.464466094, 35, -105.535533906),
        (145.535533906, 35, -4.464466094),
        (145.535533906, 35, -105.535533906),
        (125, 35, -101),
        (77.5, 35, -107),
        (137.25, 35, -107),
        (125, 35, -9),
        (75.8, 35, -3),
        (30, 35, -101),
        (24.621320344, 35, -106.121320344),
        (130.378679656, 35, -106.121320344),
        (130.378679656, 35, -3.878679656),
        (119.621320344, 35, -3.878679656),
        (35.378679656, 35, -106.121320344),
        (119.621320344, 35, -106.121320344),
        (128.621320344, 35, -101.878679656),
        (121.378679656, 35, -101.878679656),
        (33.621320344, 35, -101.878679656),
        (121.378679656, 35, -8.121320344),
        (128.621320344, 35, -8.121320344),
        (26.378679656, 35, -101.878679656),
        (3, 35, -73.6),
    ]]
    fillet(fillet9_edges, radius=FILLET9_R)


solid = part.part
